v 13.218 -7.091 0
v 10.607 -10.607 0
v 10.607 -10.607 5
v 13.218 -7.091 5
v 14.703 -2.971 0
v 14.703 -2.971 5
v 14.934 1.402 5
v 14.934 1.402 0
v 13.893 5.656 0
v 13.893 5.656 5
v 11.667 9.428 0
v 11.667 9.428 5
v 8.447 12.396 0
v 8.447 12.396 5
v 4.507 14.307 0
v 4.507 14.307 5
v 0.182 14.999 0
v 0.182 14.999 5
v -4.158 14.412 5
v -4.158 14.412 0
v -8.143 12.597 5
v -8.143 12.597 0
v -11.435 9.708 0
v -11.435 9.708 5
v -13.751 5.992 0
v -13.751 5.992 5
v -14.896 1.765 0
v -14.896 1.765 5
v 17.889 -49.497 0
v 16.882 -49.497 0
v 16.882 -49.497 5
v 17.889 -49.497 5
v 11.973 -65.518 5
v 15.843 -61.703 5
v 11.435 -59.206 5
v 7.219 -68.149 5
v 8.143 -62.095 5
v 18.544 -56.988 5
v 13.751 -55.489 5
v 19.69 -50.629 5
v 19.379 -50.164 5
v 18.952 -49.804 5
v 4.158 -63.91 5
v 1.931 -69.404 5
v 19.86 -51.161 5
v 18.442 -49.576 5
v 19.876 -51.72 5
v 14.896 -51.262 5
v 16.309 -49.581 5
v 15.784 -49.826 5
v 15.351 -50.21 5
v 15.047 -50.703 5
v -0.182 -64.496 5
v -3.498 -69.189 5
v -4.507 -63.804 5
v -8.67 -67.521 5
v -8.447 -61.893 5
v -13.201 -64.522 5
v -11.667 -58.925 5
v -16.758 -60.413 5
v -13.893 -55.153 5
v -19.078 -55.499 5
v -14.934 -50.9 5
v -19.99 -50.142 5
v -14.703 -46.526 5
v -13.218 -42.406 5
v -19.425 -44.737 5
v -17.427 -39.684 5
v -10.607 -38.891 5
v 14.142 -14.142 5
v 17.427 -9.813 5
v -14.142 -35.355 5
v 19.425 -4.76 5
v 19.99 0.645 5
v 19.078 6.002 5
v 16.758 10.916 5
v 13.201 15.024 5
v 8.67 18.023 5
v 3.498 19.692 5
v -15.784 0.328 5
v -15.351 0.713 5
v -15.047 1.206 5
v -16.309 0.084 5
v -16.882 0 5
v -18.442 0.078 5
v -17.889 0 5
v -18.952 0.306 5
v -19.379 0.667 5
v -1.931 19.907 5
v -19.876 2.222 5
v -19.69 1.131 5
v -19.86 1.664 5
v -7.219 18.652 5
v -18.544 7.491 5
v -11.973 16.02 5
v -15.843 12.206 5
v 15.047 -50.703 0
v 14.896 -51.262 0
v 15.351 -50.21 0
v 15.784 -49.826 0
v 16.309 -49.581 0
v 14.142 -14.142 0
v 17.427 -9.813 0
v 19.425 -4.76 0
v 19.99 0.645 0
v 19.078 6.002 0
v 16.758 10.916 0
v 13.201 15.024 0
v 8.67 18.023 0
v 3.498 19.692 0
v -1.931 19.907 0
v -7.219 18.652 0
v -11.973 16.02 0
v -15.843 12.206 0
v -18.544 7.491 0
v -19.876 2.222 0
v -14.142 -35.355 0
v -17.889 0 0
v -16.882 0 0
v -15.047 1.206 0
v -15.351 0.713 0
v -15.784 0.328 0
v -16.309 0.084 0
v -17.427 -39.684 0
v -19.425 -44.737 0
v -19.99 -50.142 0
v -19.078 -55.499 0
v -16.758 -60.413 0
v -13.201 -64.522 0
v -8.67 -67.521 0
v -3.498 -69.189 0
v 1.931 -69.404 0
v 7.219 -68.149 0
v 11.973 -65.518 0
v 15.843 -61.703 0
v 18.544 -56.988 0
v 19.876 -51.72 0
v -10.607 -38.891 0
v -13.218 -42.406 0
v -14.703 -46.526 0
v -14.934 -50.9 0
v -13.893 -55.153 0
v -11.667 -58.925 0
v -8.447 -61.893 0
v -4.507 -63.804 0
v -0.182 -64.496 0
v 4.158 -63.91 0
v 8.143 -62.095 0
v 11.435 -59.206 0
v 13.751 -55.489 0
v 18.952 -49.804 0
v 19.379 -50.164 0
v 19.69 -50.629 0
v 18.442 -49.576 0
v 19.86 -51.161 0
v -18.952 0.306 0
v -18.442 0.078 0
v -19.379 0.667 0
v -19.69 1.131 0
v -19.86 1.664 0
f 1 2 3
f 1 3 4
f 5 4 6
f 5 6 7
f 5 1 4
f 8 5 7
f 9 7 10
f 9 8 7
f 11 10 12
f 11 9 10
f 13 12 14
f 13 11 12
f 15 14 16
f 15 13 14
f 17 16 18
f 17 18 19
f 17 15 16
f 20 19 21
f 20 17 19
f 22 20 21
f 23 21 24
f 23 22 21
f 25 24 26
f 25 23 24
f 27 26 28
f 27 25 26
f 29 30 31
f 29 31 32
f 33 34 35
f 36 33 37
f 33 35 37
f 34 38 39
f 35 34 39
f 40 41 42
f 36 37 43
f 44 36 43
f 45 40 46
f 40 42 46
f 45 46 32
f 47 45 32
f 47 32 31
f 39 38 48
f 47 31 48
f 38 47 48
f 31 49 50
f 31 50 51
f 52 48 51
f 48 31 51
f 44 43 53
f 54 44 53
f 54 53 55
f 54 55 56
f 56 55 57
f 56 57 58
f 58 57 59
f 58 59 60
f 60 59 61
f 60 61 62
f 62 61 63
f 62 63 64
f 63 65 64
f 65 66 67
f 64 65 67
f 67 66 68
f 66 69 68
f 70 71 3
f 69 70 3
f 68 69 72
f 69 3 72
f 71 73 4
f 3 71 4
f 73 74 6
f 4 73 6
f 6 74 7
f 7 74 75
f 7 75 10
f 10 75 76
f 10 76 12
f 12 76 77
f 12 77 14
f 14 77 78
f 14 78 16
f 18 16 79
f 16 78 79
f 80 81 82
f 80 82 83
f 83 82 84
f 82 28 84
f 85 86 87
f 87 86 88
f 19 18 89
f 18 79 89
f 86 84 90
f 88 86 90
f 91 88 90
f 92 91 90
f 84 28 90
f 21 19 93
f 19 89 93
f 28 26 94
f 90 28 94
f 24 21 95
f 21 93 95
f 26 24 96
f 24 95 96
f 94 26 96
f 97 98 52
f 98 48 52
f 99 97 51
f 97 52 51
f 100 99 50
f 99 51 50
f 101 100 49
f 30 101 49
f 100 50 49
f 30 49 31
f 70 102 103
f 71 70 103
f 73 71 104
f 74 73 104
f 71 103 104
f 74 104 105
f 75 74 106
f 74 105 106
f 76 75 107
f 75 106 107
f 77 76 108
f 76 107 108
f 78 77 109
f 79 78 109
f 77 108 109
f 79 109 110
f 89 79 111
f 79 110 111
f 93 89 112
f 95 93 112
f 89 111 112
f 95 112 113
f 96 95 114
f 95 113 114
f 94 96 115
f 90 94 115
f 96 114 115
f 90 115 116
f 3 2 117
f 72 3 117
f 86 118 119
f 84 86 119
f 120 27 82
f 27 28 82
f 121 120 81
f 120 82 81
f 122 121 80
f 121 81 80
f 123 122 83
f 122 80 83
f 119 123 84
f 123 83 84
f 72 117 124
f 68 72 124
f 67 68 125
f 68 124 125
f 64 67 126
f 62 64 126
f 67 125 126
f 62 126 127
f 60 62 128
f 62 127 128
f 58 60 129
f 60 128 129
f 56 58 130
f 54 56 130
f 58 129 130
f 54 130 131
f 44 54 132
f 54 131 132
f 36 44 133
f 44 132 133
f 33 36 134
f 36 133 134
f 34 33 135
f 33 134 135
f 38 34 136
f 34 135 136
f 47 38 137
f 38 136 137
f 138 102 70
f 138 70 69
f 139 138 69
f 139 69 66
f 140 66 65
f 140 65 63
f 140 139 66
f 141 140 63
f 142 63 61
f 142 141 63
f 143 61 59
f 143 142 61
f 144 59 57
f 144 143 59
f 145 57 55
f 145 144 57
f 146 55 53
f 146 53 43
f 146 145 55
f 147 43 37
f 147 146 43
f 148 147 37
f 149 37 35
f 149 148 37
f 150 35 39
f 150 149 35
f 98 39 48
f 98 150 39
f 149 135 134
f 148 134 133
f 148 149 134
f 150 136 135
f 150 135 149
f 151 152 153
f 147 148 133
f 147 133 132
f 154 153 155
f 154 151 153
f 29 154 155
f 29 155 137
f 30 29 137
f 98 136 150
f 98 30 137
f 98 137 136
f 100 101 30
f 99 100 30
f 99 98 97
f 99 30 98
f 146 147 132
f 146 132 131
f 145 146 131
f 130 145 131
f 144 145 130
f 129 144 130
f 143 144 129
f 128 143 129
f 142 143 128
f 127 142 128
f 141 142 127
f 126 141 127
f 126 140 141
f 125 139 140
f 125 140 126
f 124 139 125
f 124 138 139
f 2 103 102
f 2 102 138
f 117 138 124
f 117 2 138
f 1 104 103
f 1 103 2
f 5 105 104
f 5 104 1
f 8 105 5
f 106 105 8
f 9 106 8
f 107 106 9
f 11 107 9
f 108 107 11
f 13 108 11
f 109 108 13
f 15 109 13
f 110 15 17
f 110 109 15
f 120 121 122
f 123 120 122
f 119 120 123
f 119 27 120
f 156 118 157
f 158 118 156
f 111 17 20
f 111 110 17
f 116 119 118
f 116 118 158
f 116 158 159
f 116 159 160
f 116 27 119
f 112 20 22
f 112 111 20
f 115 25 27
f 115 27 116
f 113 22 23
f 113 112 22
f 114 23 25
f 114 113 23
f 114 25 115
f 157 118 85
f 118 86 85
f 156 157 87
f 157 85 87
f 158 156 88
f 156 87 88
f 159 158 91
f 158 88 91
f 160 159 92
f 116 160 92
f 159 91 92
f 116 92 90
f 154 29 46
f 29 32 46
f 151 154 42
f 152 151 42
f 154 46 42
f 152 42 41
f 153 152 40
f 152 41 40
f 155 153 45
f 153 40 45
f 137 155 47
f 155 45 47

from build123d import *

# Parameters (mm, degrees)
PAD_DEPTH = 5
FILLET_R  = 2


with BuildPart() as part:
    # Sketch → Pad (new body)
    with BuildSketch(Plane.XY):
        with BuildLine():
            ThreePointArc((10.606602, -10.606602), (5.740251, 13.858193), (-15, 0))
            Line((-20, 0), (-15, 0))
            ThreePointArc((14.142136, -14.142136), (7.653669, 18.477591), (-20, 0))
            Line((14.142136, -14.142136), (-10.606602, -38.890873))
            ThreePointArc((-10.606602, -38.890873), (-5.740251, -63.355668), (15, -49.497475))
            Line((15, -49.497475), (20, -49.497475))
            ThreePointArc((-14.142136, -35.355339), (-7.653669, -67.975065), (20, -49.497475))
            Line((10.606602, -10.606602), (-14.142136, -35.355339))
        make_face()
    extrude(amount=PAD_DEPTH)

    # Fillet
    fillet_edges = [part.edges().sort_by_distance(p)[0] for p in [
        (-15, 0, 2.5),
        (-20, 0, 2.5),
        (20, -49.497475, 2.5),
        (15, -49.497475, 2.5),
    ]]
    fillet(fillet_edges, radius=FILLET_R)


solid = part.part
